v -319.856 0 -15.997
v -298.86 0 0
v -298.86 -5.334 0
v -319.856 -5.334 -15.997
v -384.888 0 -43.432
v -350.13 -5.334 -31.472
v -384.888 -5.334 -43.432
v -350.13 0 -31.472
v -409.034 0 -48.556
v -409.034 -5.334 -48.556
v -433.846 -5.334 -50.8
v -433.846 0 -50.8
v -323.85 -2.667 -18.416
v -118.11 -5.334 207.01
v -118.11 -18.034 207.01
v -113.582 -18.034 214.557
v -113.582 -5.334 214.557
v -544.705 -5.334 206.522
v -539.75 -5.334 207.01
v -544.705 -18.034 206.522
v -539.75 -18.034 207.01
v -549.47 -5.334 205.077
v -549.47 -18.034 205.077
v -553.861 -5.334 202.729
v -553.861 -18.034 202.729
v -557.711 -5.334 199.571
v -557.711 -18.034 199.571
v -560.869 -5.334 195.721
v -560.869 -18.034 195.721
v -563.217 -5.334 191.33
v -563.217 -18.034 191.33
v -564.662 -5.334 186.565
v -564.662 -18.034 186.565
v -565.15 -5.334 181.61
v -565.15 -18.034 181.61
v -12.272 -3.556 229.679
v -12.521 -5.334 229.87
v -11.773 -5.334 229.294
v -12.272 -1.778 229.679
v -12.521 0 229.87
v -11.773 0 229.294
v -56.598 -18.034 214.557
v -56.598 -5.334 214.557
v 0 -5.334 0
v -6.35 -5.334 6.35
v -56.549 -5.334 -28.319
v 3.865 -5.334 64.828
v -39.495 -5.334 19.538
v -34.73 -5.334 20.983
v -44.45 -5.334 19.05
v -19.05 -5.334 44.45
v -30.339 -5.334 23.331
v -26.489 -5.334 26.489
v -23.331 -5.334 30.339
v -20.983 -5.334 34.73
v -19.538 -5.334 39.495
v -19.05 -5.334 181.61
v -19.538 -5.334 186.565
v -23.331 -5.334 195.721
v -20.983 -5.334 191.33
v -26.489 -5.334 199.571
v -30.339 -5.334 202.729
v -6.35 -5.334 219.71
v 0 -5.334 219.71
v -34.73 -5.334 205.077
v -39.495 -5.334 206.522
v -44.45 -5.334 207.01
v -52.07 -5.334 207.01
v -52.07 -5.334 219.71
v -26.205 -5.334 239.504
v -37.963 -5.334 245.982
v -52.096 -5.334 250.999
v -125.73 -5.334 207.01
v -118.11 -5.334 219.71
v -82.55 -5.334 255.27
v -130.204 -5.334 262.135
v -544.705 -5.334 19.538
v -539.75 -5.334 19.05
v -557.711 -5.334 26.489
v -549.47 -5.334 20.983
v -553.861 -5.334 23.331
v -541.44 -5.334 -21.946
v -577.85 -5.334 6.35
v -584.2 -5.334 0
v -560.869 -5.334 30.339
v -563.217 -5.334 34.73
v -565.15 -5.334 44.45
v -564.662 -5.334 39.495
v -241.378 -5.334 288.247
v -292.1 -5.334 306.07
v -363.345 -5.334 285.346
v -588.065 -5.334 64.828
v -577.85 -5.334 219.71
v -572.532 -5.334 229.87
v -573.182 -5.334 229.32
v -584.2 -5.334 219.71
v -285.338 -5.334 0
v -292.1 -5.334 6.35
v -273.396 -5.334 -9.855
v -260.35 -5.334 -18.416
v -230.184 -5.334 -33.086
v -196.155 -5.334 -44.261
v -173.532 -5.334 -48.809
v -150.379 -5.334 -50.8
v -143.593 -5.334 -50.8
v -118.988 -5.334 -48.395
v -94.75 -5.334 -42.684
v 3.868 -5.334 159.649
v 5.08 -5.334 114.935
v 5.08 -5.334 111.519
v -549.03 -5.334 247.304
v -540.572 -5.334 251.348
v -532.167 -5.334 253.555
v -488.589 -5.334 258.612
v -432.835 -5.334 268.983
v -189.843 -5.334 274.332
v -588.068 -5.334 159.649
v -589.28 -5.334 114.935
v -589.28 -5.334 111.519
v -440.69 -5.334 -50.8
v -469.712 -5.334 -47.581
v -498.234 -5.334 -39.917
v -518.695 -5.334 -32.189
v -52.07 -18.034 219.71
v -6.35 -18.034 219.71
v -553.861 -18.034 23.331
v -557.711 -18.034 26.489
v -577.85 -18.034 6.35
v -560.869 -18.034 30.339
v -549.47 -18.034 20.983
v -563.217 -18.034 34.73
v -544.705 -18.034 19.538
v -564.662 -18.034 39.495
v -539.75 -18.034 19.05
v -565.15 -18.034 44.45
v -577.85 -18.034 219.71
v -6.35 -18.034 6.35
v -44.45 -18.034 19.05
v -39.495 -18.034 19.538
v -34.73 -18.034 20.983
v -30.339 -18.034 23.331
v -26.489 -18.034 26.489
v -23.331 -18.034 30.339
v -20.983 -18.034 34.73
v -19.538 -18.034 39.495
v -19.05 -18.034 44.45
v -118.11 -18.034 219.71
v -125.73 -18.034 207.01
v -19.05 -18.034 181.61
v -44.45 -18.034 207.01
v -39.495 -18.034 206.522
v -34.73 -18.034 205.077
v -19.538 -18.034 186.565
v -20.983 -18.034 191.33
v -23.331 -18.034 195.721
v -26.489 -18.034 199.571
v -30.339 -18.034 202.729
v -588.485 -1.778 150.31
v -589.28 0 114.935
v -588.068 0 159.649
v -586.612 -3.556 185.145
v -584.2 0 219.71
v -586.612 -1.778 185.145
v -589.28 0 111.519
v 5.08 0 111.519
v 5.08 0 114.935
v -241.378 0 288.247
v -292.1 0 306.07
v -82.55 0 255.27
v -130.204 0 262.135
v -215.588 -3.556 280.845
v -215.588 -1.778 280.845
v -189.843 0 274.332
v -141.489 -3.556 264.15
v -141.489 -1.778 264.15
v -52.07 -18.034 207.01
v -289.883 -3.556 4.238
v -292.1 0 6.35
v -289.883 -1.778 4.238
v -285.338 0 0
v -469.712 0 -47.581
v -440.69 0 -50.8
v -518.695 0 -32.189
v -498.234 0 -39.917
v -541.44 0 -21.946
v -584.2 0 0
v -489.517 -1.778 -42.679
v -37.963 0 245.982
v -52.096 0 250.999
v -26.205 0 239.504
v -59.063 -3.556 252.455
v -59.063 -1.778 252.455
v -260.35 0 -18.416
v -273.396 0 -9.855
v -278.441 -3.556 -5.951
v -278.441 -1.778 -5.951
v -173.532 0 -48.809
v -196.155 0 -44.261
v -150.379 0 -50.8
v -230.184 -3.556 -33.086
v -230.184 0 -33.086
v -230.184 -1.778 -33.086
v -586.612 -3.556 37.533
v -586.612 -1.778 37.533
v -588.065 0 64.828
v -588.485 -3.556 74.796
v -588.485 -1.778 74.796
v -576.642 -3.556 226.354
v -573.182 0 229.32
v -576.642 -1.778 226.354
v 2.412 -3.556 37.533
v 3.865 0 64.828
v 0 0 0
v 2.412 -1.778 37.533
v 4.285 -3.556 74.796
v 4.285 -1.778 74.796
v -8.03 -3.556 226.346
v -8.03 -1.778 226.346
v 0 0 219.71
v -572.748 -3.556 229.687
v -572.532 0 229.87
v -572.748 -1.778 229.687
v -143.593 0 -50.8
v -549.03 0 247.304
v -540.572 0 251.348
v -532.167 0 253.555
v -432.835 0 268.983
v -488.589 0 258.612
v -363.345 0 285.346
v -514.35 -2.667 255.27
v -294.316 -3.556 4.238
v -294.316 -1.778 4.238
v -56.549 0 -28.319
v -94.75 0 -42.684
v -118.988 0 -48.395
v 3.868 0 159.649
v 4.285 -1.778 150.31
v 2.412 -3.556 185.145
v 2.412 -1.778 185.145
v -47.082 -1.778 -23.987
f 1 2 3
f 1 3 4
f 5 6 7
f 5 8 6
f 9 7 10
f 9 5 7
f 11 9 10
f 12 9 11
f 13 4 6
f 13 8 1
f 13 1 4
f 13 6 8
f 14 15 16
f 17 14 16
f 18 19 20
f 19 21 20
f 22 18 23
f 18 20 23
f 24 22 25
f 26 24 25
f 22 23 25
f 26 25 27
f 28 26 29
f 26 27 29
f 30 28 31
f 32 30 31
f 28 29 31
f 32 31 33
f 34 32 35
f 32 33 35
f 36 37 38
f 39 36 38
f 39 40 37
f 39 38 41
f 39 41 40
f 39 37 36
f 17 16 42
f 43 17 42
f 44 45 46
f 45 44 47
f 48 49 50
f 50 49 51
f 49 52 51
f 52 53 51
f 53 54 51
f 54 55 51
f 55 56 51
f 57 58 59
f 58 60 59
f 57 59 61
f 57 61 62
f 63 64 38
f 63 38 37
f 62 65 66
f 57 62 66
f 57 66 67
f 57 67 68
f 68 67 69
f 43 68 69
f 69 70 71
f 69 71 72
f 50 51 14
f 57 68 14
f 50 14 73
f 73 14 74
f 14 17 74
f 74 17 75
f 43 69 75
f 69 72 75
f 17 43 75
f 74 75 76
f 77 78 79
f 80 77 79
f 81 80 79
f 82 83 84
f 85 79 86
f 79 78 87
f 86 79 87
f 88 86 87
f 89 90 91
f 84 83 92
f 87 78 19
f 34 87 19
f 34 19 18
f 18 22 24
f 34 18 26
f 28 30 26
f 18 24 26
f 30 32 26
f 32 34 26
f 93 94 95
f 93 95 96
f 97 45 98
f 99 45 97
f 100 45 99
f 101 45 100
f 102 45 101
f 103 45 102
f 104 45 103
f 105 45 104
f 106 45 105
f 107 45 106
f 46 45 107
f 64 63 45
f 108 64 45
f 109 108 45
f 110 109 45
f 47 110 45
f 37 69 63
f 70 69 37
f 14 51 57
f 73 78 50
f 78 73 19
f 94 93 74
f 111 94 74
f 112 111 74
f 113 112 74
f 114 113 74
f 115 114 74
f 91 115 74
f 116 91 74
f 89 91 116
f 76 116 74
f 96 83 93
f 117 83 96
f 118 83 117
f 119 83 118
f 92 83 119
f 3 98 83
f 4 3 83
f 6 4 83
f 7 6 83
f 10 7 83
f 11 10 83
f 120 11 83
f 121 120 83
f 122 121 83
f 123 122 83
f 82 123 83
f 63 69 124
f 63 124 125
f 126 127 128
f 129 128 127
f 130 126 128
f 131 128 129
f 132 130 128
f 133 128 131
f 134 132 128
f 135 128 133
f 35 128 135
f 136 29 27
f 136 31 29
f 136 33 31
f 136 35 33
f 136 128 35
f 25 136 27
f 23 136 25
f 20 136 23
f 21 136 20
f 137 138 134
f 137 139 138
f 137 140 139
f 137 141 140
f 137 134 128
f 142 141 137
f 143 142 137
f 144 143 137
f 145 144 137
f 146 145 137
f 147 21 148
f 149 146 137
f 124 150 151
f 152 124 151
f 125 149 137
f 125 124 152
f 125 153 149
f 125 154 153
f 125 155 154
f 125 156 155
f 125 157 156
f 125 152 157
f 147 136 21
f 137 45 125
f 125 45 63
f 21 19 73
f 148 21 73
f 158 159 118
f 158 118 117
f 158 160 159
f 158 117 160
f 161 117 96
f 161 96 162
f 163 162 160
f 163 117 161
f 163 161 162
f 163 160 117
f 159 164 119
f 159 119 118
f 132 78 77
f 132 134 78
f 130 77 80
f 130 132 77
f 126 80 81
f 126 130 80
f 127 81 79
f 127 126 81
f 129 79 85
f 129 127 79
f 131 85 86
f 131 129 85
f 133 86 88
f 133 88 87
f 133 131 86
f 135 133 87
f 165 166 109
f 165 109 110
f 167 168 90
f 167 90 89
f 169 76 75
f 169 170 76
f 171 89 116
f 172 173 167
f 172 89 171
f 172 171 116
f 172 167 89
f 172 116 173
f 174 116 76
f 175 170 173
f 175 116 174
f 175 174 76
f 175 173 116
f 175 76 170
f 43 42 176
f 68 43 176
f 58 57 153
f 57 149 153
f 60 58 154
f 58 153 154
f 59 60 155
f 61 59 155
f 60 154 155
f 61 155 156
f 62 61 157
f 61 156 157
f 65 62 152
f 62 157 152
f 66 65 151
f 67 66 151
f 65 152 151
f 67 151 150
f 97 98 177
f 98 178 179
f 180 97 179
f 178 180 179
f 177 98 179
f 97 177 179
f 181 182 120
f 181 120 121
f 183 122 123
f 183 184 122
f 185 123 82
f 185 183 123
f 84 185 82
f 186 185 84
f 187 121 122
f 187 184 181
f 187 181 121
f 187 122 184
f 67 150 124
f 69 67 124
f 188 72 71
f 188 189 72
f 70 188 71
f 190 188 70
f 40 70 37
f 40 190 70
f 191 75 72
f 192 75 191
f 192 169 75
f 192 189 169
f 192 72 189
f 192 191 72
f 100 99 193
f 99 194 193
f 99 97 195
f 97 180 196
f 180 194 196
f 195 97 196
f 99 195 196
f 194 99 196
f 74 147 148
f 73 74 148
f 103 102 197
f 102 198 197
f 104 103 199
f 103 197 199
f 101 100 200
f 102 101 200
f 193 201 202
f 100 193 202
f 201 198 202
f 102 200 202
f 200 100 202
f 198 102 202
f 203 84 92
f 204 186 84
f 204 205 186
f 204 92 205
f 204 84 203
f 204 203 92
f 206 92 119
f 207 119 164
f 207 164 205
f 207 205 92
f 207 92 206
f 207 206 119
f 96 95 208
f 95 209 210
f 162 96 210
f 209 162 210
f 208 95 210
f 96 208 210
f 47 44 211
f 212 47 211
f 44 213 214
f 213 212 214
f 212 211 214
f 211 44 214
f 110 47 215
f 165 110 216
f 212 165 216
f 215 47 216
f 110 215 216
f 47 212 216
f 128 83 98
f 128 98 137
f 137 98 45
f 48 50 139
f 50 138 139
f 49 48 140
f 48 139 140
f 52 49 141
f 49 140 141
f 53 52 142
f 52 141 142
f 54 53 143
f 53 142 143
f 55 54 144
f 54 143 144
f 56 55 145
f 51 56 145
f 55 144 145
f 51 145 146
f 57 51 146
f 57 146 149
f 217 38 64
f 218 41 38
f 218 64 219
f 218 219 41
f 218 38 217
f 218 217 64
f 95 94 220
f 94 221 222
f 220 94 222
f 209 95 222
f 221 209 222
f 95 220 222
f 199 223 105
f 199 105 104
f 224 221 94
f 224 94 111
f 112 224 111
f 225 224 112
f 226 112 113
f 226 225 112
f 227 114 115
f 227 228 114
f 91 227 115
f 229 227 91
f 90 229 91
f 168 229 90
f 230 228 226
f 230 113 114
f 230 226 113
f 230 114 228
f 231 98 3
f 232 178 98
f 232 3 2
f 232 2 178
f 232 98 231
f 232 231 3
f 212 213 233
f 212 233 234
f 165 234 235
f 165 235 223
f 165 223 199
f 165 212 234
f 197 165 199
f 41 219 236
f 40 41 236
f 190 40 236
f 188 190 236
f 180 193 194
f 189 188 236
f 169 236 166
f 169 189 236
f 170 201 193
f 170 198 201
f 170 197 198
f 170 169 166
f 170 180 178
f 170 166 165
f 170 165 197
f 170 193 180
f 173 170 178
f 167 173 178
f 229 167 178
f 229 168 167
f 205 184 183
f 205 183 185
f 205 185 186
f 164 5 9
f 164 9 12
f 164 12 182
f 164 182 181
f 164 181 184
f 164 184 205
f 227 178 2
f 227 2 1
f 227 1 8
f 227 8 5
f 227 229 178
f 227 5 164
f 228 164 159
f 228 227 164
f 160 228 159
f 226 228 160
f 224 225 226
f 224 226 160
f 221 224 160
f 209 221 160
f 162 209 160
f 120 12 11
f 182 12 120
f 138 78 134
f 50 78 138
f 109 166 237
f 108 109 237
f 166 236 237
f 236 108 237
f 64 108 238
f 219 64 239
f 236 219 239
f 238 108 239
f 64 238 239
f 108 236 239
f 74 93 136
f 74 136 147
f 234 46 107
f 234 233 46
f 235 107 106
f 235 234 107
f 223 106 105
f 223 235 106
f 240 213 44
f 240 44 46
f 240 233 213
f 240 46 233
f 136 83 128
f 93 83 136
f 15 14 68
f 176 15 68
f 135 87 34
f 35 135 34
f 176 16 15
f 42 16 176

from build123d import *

# Parameters (mm, degrees)
F0_W     = 584.2
F0_H     = 219.71
F1_DEPTH = 5.334
F2_W     = 571.5
F2_H     = 213.36
F2_W_2   = 546.1
F2_H_2   = 187.96
F3_DEPTH = 12.7
F4_R     = 25.4
F6_DEPTH = 12.7
F8_DEPTH = 5.334
F9_DEPTH = 5.334


# Not quite as in the source:
# - a feature names something its author has since deleted; it is built from what else it names


with BuildPart() as f1:
    # F0 (on Front) → F1 (new body)
    with BuildSketch(Plane.XZ):
        with Locations((-292.1, 109.855)):
            Rectangle(F0_W, F0_H)
    extrude(amount=F1_DEPTH)

    # F2 (on face) → F3 (join)
    with BuildSketch(Plane.XZ.offset(5.334)):
        with Locations((-292.1, 113.03)):
            Rectangle(F2_W, F2_H)
        with Locations((-292.1, 113.03)):
            Rectangle(F2_W_2, F2_H_2, mode=Mode.SUBTRACT)
    extrude(amount=F3_DEPTH)

    # F4
    f4_edges = [f1.edges().sort_by_distance(p)[0] for p in [
        (-565.15, -11.684, 207.01),
        (-19.05, -11.684, 207.01),
        (-19.05, -11.684, 19.05),
        (-565.15, -11.684, 19.05),
    ]]
    fillet(f4_edges, radius=F4_R)

    # F5 (on face) → F6 (cut)
    with BuildSketch(Plane.XZ.offset(18.034)):
        Polygon((-118.11, 219.71), (-125.73, 207.01), (-118.11, 207.01), (-113.5820166854, 214.5566388576), (-110.49, 219.71), align=None)
        Polygon((-56.5979833146, 214.5566388576), (-52.07, 207.01), (-44.45, 207.01), (-52.07, 219.71), (-59.69, 219.71), align=None)
        Polygon((-59.69, 219.71), (-110.49, 219.71), (-113.5820166854, 214.5566388576), (-56.5979833146, 214.5566388576), align=None)
    extrude(amount=-F6_DEPTH, mode=Mode.SUBTRACT)

    # F7 (on face) → F8 (cut)
    with BuildSketch(Plane(origin=(0, 0, 0), x_dir=(-1, 0, 0), z_dir=(0, 1, 0))):
        with BuildLine():
            add(Edge.make_bspline(
                [(292.1, 6.35), (289.8878914708, 4.2388101088), (287.6757829415, 2.1276202176), (285.3383261504, 0)],
                knots=[0, 0, 0, 0, 0.0566650496, 0.0566650496, 0.0566650496, 0.0566650496], degree=3))
            Line((285.3383261504, 0), (292.1, 0))
            Line((292.1, 0), (292.1, 6.35))
        make_face()
        with BuildLine():
            add(Edge.make_bspline(
                [(292.1, 6.35), (294.3115112442, 4.2388053382), (296.5230224884, 2.1276106765), (298.8599853109, 0)],
                knots=[0, 0, 0, 0, 0.056662645, 0.056662645, 0.056662645, 0.056662645], degree=3))
            Line((292.1, 6.35), (292.1, 0))
            Line((292.1, 0), (298.8599853109, 0))
        make_face()
    extrude(amount=-F8_DEPTH, mode=Mode.SUBTRACT)

    # F7 (on face) → F9 (join)
    with BuildSketch(Plane(origin=(0, 0, 0), x_dir=(-1, 0, 0), z_dir=(0, 1, 0))):
        with BuildLine():
            Line((285.3383261504, 0), (0, 0))
            add(Edge.make_bspline(
                [(35.5548654074, -18.4164866805), (23.6750755263, -12.5314961521), (11.8375377632, -6.265748076), (0, 0)],
                knots=[0.8952858021, 0.8952858021, 0.8952858021, 0.8952858021, 1, 1, 1, 1], degree=3))
            Line((35.5548654074, -18.4164866805), (260.35, -18.4164866805))
            add(Edge.make_bspline(
                [(285.3383261504, 0), (278.8607301271, -5.8960937002), (271.4205053001, -11.9183662972), (260.35, -18.4164866805)],
                knots=[0.0566650496, 0.0566650496, 0.0566650496, 0.0566650496, 0.2136961022, 0.2136961022, 0.2136961022, 0.2136961022], degree=3))
        make_face()
        with BuildLine():
            add(Edge.make_bspline(
                [(0, 0), (-2.5016001756, 37.5778391816), (-5.0032003512, 75.1556783631), (-5.08, 111.5191693883)],
                knots=[0, 0, 0, 0, 0.4959951232, 0.4959951232, 0.4959951232, 0.4959951232], degree=3))
            Line((0, 0), (0, 219.71))
            add(Edge.make_bspline(
                [(-5.08, 114.935), (-5.0035853497, 150.6697582461), (-2.5017926748, 185.189879123), (0, 219.71)],
                knots=[0.5115421197, 0.5115421197, 0.5115421197, 0.5115421197, 1, 1, 1, 1], degree=3))
            Line((-5.08, 114.935), (-5.08, 111.5191693883))
        make_face()
        with BuildLine():
            Line((260.35, -18.4164866805), (35.5548654074, -18.4164866805))
            add(Edge.make_bspline(
                [(143.5928555626, -50.8), (106.470496214, -50.0055886792), (70.8264502644, -35.8892656507), (35.5548654074, -18.4164866805)],
                knots=[0.5843850409, 0.5843850409, 0.5843850409, 0.5843850409, 0.8952858021, 0.8952858021, 0.8952858021, 0.8952858021], degree=3))
            Line((143.5928555626, -50.8), (150.3785817486, -50.8))
            add(Edge.make_bspline(
                [(260.35, -18.4164866805), (235.5497171967, -32.973656279), (192.5306851802, -49.9188924594), (150.3785817486, -50.8)],
                knots=[0.2136961022, 0.2136961022, 0.2136961022, 0.2136961022, 0.5654790071, 0.5654790071, 0.5654790071, 0.5654790071], degree=3))
        make_face()
        with BuildLine():
            add(Edge.make_bspline(
                [(11.7731056729, 229.2938254471), (8.1151931686, 226.4637173569), (4.2088787391, 223.2851496368), (0, 219.71)],
                knots=[0.9578423111, 0.9578423111, 0.9578423111, 0.9578423111, 1, 1, 1, 1], degree=3))
            Line((0, 219.71), (292.1, 219.71))
            Line((292.1, 219.71), (11.7731056729, 229.2938254471))
        make_face()
        with BuildLine():
            add(Edge.make_bspline(
                [(12.5206463088, 229.87), (12.2726179558, 229.6795636028), (12.0234435309, 229.4875105602), (11.7731056729, 229.2938254471)],
                knots=[0.9549571504, 0.9549571504, 0.9549571504, 0.9549571504, 0.9578423111, 0.9578423111, 0.9578423111, 0.9578423111], degree=3))
            Line((11.7731056729, 229.2938254471), (292.1, 219.71))
            Line((292.1, 219.71), (573.1817260974, 229.3196316614))
            add(Edge.make_bspline(
                [(572.5320605941, 229.87), (572.7473841939, 229.6879525114), (572.9639346328, 229.5045002197), (573.1817260974, 229.3196316614)],
                knots=[0.9616983958, 0.9616983958, 0.9616983958, 0.9616983958, 0.9640299265, 0.9640299265, 0.9640299265, 0.9640299265], degree=3))
            Line((572.5320605941, 229.87), (514.35, 229.87))
            Line((514.35, 229.87), (292.1, 229.87))
            Line((292.1, 229.87), (82.55, 229.87))
            Line((82.55, 229.87), (12.5206463088, 229.87))
        make_face()
        with BuildLine():
            Line((573.1817260974, 229.3196316614), (292.1, 219.71))
            Line((292.1, 219.71), (584.2, 219.71))
            add(Edge.make_bspline(
                [(573.1817260974, 229.3196316614), (576.5417396252, 226.4675416698), (580.1971331881, 223.2783621084), (584.2, 219.71)],
                knots=[0.9640299265, 0.9640299265, 0.9640299265, 0.9640299265, 1, 1, 1, 1], degree=3))
        make_face()
        with BuildLine():
            add(Edge.make_bspline(
                [(298.8599853109, 0), (305.3364495341, -5.8962831133), (312.7764065366, -11.9186444461), (323.85, -18.4164866805)],
                knots=[0.056662645, 0.056662645, 0.056662645, 0.056662645, 0.2136927825, 0.2136927825, 0.2136927825, 0.2136927825], degree=3))
            Line((323.85, -18.4164866805), (548.6673215949, -18.4164866805))
            add(Edge.make_bspline(
                [(548.6673215949, -18.4164866805), (560.540064076, -12.5314899408), (572.370032038, -6.2657449704), (584.2, 0)],
                knots=[0.8952964295, 0.8952964295, 0.8952964295, 0.8952964295, 1, 1, 1, 1], degree=3))
            Line((584.2, 0), (298.8599853109, 0))
        make_face()
        with BuildLine():
            Line((548.6673215949, -18.4164866805), (323.85, -18.4164866805))
            add(Edge.make_bspline(
                [(323.85, -18.4164866805), (348.6543054028, -32.9713340996), (391.6899454814, -49.9118498543), (433.8458201185, -50.8)],
                knots=[0.2136927825, 0.2136927825, 0.2136927825, 0.2136927825, 0.5654325768, 0.5654325768, 0.5654325768, 0.5654325768], degree=3))
            Line((433.8458201185, -50.8), (440.69, -50.8))
            add(Edge.make_bspline(
                [(440.69, -50.8), (477.8051745876, -49.9992725657), (513.4246952416, -35.8853016167), (548.6673215949, -18.4164866805)],
                knots=[0.5844980763, 0.5844980763, 0.5844980763, 0.5844980763, 0.8952964295, 0.8952964295, 0.8952964295, 0.8952964295], degree=3))
        make_face()
        with BuildLine():
            add(Edge.make_bspline(
                [(82.55, 255.27), (55.6261452853, 252.2921647864), (42.3764019315, 252.7932765823), (12.5206463088, 229.87)],
                knots=[0.6076635734, 0.6076635734, 0.6076635734, 0.6076635734, 0.9549571504, 0.9549571504, 0.9549571504, 0.9549571504], degree=3))
            Line((12.5206463088, 229.87), (82.55, 229.87))
            Line((82.55, 229.87), (82.55, 255.27))
        make_face()
        with BuildLine():
            add(Edge.make_bspline(
                [(589.28, 114.935), (589.2035853497, 150.6697582461), (586.7017926748, 185.189879123), (584.2, 219.71)],
                knots=[0.5115421197, 0.5115421197, 0.5115421197, 0.5115421197, 1, 1, 1, 1], degree=3))
            Line((584.2, 219.71), (584.2, 0))
            add(Edge.make_bspline(
                [(584.2, 0), (586.7016001756, 37.5778391816), (589.2032003512, 75.1556783632), (589.28, 111.5191693884)],
                knots=[0, 0, 0, 0, 0.4959951232, 0.4959951232, 0.4959951232, 0.4959951232], degree=3))
            Line((589.28, 111.5191693884), (589.28, 114.935))
        make_face()
        with BuildLine():
            Line((82.55, 255.27), (82.55, 229.87))
            Line((82.55, 229.87), (292.1, 229.87))
            Line((292.1, 229.87), (292.1, 306.07))
            add(Edge.make_bspline(
                [(292.1, 306.07), (218.631118536, 276.3414680958), (129.6589788413, 260.4803525873), (82.55, 255.27)],
                knots=[0, 0, 0, 0, 0.6076635734, 0.6076635734, 0.6076635734, 0.6076635734], degree=3))
        make_face()
        with BuildLine():
            Line((514.35, 229.87), (572.5320605941, 229.87))
            add(Edge.make_bspline(
                [(514.35, 255.27), (536.1096268059, 253.2414037435), (541.9337770664, 255.7396244938), (572.5320605941, 229.87)],
                knots=[0.6303792087, 0.6303792087, 0.6303792087, 0.6303792087, 0.9616983958, 0.9616983958, 0.9616983958, 0.9616983958], degree=3))
            Line((514.35, 255.27), (514.35, 229.87))
        make_face()
        with BuildLine():
            Line((292.1, 306.07), (292.1, 229.87))
            Line((292.1, 229.87), (514.35, 229.87))
            Line((514.35, 229.87), (514.35, 255.27))
            add(Edge.make_bspline(
                [(292.1, 306.07), (373.8620877266, 279.3765068054), (472.9493903602, 259.129676569), (514.35, 255.27)],
                knots=[0, 0, 0, 0, 0.6303792087, 0.6303792087, 0.6303792087, 0.6303792087], degree=3))
        make_face()
    extrude(amount=-F9_DEPTH)


solid = f1.part
